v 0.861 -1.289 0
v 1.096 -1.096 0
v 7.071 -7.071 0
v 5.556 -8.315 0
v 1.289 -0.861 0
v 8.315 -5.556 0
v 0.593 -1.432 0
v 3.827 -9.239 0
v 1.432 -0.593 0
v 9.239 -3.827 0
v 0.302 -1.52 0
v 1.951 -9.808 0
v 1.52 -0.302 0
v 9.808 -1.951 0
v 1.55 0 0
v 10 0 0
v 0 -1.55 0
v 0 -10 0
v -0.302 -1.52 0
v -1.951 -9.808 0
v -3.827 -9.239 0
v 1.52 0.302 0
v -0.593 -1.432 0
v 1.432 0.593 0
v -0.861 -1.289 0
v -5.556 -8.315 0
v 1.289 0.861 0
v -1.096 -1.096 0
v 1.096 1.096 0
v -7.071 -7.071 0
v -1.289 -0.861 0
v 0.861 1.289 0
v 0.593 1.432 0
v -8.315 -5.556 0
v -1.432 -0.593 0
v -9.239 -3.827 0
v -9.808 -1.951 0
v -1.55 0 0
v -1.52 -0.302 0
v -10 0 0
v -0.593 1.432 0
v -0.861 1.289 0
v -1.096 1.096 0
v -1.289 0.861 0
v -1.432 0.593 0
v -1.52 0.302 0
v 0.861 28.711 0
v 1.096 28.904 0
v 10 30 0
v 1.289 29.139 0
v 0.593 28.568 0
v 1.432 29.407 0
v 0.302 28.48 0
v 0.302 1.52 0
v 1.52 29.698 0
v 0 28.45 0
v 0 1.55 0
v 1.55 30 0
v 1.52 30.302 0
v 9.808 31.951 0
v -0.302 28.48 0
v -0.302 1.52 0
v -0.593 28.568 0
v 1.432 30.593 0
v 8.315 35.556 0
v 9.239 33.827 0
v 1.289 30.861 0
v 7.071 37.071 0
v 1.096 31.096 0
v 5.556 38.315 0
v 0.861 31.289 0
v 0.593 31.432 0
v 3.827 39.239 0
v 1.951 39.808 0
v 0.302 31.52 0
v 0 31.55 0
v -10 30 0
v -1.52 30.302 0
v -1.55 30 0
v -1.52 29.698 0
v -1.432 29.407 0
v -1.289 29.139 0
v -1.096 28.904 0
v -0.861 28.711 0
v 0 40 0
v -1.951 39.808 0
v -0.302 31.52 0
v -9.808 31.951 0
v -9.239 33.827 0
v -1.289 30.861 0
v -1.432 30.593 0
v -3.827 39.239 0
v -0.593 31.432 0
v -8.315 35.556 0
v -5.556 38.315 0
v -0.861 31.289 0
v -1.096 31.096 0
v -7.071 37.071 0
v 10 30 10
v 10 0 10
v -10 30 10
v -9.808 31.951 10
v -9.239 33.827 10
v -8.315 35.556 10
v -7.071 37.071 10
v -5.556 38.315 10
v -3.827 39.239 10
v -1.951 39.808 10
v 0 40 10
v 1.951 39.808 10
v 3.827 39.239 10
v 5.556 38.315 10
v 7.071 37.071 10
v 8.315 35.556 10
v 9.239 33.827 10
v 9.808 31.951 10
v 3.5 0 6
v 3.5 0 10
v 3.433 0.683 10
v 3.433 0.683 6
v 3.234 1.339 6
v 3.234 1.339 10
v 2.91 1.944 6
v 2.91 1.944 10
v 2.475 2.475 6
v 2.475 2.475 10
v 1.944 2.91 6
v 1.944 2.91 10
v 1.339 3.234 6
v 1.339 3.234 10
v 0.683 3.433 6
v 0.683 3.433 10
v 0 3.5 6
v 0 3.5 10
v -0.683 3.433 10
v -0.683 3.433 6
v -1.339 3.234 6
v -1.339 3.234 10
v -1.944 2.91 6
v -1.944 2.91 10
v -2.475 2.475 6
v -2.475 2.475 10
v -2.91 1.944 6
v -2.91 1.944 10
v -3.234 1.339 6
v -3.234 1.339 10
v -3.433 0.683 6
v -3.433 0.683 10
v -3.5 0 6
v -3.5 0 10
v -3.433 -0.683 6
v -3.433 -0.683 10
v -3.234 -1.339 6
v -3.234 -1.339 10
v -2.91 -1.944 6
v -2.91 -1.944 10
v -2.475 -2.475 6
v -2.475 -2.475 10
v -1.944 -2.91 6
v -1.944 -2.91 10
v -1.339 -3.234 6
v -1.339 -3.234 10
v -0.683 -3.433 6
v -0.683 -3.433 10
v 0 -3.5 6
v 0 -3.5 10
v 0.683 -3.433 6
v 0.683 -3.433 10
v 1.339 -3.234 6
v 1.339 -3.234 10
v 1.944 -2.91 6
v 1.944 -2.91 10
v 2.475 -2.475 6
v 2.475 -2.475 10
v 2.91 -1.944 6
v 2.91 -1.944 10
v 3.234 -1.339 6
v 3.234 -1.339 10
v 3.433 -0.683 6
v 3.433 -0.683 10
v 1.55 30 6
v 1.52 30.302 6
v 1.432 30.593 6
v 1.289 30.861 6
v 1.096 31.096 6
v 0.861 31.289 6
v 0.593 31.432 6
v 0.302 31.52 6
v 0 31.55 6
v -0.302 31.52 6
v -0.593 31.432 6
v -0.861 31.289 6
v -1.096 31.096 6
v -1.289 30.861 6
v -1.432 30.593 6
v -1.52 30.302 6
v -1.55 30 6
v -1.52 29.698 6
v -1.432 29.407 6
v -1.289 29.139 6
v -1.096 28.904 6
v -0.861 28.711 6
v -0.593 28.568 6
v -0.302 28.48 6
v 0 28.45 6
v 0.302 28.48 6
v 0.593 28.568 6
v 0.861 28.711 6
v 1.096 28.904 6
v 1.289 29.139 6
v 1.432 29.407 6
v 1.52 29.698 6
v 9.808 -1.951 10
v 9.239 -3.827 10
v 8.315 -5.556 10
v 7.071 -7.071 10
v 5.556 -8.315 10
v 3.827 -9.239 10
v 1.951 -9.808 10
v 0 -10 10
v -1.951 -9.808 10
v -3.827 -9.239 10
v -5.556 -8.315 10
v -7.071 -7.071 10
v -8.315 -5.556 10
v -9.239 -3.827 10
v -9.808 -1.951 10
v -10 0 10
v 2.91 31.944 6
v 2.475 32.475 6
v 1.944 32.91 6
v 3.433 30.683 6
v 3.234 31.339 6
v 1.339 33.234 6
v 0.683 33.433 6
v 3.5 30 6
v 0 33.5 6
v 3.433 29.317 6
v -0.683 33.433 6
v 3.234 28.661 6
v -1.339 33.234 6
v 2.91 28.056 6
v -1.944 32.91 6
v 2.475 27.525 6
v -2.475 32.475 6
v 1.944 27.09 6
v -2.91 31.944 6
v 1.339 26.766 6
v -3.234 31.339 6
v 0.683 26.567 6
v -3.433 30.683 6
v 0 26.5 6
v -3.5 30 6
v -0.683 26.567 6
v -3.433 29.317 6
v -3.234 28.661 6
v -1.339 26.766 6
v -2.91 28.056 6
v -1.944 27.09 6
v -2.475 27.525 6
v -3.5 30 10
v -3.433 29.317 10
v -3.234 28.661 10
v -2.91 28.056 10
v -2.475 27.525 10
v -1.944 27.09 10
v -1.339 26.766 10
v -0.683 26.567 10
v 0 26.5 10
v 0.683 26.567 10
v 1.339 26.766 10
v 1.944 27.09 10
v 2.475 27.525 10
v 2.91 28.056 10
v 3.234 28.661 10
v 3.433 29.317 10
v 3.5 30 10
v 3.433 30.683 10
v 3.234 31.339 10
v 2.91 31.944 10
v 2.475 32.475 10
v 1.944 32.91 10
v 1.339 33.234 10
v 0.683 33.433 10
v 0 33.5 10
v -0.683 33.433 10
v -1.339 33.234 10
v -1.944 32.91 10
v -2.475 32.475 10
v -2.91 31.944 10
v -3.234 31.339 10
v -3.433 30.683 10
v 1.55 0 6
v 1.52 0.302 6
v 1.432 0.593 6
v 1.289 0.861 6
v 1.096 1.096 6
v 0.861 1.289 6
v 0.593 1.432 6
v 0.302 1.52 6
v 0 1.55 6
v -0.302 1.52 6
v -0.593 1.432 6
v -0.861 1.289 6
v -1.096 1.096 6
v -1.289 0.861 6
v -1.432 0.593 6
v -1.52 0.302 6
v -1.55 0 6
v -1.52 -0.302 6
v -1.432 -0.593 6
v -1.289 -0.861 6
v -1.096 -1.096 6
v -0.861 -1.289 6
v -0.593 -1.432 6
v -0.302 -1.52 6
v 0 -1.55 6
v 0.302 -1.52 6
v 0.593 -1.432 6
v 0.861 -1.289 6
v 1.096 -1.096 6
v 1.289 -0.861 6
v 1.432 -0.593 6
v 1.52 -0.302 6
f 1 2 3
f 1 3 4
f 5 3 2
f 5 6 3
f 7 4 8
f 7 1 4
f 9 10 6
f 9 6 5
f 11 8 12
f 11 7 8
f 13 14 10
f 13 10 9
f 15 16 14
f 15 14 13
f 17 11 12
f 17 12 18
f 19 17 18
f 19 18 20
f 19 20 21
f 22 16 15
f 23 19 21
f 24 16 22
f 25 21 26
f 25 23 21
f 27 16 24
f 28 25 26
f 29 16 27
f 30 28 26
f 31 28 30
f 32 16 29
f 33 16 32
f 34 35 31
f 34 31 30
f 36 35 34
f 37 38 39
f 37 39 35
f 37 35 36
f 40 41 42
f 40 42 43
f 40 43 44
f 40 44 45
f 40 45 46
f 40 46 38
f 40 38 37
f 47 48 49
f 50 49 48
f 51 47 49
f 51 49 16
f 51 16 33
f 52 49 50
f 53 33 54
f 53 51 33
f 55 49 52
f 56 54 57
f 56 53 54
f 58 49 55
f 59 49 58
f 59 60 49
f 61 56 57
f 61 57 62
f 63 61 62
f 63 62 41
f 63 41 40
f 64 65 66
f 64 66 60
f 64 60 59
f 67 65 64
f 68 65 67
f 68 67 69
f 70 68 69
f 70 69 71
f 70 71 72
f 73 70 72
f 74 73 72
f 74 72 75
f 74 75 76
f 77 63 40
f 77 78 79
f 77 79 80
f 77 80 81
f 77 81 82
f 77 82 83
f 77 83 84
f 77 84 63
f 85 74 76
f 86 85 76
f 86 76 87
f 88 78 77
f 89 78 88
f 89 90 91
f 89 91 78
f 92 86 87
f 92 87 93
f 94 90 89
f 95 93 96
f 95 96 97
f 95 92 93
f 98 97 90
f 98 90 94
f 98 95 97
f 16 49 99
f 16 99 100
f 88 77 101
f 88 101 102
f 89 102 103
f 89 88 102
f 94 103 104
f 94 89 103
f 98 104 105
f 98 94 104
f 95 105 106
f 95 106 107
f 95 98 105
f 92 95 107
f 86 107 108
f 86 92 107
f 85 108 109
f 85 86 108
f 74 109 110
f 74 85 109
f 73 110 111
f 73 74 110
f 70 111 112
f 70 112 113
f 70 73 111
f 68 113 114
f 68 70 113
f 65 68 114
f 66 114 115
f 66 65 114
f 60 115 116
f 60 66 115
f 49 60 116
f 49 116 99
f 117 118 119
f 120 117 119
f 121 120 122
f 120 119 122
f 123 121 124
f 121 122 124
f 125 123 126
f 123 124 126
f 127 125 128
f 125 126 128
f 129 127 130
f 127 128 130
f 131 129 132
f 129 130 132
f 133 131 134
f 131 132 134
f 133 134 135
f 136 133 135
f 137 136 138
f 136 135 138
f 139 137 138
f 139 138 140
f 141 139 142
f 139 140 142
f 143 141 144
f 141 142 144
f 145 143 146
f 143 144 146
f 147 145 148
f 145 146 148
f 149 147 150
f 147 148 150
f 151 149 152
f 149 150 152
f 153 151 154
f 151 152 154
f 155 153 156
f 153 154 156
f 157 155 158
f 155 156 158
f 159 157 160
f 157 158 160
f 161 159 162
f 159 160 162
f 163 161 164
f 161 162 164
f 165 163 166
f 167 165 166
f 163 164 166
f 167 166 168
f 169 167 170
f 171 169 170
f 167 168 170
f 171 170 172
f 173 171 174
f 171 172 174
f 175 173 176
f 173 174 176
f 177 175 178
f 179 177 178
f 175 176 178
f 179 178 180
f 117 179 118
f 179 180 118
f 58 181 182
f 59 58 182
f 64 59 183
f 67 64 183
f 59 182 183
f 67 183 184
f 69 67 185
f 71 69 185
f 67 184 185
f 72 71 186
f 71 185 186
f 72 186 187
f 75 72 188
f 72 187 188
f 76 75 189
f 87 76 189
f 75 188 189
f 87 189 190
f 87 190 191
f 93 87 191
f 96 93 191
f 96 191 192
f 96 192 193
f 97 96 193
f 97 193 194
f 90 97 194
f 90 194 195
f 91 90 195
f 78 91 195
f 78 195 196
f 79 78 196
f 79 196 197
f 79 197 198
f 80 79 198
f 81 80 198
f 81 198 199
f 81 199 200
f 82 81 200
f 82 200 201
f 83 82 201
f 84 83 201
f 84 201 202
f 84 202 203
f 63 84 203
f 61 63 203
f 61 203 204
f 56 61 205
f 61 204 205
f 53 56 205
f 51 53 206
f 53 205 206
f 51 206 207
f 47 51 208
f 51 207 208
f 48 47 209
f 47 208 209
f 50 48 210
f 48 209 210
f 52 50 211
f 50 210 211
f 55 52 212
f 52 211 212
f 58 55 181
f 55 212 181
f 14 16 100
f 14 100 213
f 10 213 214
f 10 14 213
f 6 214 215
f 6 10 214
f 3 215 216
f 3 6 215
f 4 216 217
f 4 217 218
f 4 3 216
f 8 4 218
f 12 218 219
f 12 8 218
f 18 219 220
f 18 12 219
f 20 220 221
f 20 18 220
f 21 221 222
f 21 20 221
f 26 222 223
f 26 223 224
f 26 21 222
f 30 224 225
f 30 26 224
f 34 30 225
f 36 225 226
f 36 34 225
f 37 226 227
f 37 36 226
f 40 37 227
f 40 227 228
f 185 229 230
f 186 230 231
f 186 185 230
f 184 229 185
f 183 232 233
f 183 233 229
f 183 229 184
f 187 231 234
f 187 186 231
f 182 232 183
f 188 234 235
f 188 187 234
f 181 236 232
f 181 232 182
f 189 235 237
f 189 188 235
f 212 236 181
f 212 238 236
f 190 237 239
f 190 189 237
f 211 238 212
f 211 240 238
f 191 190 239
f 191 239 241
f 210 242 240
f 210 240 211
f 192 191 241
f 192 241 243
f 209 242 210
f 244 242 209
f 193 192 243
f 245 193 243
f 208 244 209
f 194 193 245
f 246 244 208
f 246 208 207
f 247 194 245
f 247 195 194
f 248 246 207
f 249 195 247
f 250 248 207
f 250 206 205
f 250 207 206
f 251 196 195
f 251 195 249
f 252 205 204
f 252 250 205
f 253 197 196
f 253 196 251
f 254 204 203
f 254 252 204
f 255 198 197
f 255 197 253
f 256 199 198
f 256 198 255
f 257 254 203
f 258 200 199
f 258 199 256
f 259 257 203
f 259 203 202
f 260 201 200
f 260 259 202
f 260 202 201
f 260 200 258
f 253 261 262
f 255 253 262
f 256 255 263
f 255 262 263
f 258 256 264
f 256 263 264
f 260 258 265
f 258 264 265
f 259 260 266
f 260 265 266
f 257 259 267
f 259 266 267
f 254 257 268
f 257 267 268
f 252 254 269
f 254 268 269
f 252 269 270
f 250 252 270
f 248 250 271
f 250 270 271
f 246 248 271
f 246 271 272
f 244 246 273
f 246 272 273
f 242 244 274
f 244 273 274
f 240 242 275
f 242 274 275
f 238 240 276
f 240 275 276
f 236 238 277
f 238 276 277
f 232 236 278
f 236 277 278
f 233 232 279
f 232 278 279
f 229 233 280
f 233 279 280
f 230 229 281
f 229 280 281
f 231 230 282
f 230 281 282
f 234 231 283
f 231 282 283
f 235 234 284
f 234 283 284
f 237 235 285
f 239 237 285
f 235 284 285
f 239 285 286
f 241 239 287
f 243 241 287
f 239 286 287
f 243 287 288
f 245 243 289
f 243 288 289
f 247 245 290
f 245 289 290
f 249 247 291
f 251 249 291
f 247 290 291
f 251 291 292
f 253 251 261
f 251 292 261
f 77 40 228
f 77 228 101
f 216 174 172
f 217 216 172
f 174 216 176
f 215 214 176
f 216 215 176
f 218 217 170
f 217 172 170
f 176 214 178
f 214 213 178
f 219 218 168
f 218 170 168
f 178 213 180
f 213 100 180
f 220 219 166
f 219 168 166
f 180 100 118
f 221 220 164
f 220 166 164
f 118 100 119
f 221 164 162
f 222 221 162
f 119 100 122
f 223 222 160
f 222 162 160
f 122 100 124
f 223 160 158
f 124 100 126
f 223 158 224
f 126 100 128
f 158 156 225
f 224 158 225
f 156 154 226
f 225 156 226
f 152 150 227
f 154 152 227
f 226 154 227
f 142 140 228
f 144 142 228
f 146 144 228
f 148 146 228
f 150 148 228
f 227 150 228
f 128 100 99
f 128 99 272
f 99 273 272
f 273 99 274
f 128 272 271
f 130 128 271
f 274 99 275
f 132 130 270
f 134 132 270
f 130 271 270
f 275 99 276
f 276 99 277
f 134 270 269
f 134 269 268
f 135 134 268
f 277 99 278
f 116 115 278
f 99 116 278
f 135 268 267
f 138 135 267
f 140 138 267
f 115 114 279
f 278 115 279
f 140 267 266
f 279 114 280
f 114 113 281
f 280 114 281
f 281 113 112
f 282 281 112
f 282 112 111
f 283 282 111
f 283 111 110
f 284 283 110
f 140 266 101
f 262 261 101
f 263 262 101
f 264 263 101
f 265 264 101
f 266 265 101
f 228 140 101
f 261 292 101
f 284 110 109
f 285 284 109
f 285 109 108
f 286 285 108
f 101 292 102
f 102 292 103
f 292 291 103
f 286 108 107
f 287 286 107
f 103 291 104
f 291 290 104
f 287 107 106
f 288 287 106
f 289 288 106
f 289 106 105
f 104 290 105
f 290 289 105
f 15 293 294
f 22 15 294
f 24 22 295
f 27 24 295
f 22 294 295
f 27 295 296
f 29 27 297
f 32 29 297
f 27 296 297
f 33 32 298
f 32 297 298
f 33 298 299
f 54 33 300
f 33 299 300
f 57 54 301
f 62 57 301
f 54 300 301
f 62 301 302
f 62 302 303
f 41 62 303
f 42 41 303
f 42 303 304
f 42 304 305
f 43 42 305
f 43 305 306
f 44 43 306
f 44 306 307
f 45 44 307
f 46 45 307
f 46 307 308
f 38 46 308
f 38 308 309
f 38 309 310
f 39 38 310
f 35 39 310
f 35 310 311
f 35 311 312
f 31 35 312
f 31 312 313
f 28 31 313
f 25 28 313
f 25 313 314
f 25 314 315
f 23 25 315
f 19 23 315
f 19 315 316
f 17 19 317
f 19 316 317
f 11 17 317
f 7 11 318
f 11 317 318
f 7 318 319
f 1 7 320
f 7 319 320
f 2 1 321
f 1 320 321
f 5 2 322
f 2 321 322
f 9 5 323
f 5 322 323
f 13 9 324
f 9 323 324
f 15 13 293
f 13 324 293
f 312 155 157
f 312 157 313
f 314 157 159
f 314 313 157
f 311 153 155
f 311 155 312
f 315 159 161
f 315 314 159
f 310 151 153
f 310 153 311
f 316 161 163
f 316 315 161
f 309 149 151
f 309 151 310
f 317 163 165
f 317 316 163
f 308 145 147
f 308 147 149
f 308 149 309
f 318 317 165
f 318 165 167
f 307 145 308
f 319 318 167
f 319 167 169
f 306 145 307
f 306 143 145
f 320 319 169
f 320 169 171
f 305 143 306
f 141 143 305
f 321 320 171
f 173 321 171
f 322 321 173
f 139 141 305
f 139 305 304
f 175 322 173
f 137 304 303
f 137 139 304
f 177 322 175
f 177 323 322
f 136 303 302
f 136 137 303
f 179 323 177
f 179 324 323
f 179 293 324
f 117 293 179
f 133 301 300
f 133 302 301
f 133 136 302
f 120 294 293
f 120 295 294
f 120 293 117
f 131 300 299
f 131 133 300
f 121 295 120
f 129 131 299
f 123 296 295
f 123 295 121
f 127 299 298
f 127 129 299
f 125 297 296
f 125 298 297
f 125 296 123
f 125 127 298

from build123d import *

# Parameters (mm, degrees)
BOSS_EXTRUDE1_DEPTH = 10
SKETCH3_R           = 3.5
CUT_EXTRUDE1_DEPTH  = 4
SKETCH4_R           = 1.55
CUT_EXTRUDE2_DEPTH  = 22


with BuildPart() as part:
    # Sketch1 → Boss-Extrude1 (new body)
    with BuildSketch(Plane.XY):
        with BuildLine():
            Line((-10, 0), (-10, 30))
            ThreePointArc((-10, 30), (0, 40), (10, 30))
            Line((10, 30), (10, 0))
            ThreePointArc((10, 0), (0, -10), (-10, 0))
        make_face()
    extrude(amount=BOSS_EXTRUDE1_DEPTH)

    # Sketch3 → Cut-Extrude1 (cut)
    with BuildSketch(Plane.XY.offset(10)):
        Circle(SKETCH3_R)
        with Locations(Location((0, 30, 0), (0, 0, 180))):
            Circle(SKETCH3_R)
    extrude(amount=-CUT_EXTRUDE1_DEPTH, mode=Mode.SUBTRACT)

    # Sketch4 → Cut-Extrude2 (cut)
    with BuildSketch(Plane.XY.offset(6)):
        Circle(SKETCH4_R)
        with Locations((0, 30)):
            Circle(SKETCH4_R)
    extrude(amount=-CUT_EXTRUDE2_DEPTH, mode=Mode.SUBTRACT)


solid = part.part
